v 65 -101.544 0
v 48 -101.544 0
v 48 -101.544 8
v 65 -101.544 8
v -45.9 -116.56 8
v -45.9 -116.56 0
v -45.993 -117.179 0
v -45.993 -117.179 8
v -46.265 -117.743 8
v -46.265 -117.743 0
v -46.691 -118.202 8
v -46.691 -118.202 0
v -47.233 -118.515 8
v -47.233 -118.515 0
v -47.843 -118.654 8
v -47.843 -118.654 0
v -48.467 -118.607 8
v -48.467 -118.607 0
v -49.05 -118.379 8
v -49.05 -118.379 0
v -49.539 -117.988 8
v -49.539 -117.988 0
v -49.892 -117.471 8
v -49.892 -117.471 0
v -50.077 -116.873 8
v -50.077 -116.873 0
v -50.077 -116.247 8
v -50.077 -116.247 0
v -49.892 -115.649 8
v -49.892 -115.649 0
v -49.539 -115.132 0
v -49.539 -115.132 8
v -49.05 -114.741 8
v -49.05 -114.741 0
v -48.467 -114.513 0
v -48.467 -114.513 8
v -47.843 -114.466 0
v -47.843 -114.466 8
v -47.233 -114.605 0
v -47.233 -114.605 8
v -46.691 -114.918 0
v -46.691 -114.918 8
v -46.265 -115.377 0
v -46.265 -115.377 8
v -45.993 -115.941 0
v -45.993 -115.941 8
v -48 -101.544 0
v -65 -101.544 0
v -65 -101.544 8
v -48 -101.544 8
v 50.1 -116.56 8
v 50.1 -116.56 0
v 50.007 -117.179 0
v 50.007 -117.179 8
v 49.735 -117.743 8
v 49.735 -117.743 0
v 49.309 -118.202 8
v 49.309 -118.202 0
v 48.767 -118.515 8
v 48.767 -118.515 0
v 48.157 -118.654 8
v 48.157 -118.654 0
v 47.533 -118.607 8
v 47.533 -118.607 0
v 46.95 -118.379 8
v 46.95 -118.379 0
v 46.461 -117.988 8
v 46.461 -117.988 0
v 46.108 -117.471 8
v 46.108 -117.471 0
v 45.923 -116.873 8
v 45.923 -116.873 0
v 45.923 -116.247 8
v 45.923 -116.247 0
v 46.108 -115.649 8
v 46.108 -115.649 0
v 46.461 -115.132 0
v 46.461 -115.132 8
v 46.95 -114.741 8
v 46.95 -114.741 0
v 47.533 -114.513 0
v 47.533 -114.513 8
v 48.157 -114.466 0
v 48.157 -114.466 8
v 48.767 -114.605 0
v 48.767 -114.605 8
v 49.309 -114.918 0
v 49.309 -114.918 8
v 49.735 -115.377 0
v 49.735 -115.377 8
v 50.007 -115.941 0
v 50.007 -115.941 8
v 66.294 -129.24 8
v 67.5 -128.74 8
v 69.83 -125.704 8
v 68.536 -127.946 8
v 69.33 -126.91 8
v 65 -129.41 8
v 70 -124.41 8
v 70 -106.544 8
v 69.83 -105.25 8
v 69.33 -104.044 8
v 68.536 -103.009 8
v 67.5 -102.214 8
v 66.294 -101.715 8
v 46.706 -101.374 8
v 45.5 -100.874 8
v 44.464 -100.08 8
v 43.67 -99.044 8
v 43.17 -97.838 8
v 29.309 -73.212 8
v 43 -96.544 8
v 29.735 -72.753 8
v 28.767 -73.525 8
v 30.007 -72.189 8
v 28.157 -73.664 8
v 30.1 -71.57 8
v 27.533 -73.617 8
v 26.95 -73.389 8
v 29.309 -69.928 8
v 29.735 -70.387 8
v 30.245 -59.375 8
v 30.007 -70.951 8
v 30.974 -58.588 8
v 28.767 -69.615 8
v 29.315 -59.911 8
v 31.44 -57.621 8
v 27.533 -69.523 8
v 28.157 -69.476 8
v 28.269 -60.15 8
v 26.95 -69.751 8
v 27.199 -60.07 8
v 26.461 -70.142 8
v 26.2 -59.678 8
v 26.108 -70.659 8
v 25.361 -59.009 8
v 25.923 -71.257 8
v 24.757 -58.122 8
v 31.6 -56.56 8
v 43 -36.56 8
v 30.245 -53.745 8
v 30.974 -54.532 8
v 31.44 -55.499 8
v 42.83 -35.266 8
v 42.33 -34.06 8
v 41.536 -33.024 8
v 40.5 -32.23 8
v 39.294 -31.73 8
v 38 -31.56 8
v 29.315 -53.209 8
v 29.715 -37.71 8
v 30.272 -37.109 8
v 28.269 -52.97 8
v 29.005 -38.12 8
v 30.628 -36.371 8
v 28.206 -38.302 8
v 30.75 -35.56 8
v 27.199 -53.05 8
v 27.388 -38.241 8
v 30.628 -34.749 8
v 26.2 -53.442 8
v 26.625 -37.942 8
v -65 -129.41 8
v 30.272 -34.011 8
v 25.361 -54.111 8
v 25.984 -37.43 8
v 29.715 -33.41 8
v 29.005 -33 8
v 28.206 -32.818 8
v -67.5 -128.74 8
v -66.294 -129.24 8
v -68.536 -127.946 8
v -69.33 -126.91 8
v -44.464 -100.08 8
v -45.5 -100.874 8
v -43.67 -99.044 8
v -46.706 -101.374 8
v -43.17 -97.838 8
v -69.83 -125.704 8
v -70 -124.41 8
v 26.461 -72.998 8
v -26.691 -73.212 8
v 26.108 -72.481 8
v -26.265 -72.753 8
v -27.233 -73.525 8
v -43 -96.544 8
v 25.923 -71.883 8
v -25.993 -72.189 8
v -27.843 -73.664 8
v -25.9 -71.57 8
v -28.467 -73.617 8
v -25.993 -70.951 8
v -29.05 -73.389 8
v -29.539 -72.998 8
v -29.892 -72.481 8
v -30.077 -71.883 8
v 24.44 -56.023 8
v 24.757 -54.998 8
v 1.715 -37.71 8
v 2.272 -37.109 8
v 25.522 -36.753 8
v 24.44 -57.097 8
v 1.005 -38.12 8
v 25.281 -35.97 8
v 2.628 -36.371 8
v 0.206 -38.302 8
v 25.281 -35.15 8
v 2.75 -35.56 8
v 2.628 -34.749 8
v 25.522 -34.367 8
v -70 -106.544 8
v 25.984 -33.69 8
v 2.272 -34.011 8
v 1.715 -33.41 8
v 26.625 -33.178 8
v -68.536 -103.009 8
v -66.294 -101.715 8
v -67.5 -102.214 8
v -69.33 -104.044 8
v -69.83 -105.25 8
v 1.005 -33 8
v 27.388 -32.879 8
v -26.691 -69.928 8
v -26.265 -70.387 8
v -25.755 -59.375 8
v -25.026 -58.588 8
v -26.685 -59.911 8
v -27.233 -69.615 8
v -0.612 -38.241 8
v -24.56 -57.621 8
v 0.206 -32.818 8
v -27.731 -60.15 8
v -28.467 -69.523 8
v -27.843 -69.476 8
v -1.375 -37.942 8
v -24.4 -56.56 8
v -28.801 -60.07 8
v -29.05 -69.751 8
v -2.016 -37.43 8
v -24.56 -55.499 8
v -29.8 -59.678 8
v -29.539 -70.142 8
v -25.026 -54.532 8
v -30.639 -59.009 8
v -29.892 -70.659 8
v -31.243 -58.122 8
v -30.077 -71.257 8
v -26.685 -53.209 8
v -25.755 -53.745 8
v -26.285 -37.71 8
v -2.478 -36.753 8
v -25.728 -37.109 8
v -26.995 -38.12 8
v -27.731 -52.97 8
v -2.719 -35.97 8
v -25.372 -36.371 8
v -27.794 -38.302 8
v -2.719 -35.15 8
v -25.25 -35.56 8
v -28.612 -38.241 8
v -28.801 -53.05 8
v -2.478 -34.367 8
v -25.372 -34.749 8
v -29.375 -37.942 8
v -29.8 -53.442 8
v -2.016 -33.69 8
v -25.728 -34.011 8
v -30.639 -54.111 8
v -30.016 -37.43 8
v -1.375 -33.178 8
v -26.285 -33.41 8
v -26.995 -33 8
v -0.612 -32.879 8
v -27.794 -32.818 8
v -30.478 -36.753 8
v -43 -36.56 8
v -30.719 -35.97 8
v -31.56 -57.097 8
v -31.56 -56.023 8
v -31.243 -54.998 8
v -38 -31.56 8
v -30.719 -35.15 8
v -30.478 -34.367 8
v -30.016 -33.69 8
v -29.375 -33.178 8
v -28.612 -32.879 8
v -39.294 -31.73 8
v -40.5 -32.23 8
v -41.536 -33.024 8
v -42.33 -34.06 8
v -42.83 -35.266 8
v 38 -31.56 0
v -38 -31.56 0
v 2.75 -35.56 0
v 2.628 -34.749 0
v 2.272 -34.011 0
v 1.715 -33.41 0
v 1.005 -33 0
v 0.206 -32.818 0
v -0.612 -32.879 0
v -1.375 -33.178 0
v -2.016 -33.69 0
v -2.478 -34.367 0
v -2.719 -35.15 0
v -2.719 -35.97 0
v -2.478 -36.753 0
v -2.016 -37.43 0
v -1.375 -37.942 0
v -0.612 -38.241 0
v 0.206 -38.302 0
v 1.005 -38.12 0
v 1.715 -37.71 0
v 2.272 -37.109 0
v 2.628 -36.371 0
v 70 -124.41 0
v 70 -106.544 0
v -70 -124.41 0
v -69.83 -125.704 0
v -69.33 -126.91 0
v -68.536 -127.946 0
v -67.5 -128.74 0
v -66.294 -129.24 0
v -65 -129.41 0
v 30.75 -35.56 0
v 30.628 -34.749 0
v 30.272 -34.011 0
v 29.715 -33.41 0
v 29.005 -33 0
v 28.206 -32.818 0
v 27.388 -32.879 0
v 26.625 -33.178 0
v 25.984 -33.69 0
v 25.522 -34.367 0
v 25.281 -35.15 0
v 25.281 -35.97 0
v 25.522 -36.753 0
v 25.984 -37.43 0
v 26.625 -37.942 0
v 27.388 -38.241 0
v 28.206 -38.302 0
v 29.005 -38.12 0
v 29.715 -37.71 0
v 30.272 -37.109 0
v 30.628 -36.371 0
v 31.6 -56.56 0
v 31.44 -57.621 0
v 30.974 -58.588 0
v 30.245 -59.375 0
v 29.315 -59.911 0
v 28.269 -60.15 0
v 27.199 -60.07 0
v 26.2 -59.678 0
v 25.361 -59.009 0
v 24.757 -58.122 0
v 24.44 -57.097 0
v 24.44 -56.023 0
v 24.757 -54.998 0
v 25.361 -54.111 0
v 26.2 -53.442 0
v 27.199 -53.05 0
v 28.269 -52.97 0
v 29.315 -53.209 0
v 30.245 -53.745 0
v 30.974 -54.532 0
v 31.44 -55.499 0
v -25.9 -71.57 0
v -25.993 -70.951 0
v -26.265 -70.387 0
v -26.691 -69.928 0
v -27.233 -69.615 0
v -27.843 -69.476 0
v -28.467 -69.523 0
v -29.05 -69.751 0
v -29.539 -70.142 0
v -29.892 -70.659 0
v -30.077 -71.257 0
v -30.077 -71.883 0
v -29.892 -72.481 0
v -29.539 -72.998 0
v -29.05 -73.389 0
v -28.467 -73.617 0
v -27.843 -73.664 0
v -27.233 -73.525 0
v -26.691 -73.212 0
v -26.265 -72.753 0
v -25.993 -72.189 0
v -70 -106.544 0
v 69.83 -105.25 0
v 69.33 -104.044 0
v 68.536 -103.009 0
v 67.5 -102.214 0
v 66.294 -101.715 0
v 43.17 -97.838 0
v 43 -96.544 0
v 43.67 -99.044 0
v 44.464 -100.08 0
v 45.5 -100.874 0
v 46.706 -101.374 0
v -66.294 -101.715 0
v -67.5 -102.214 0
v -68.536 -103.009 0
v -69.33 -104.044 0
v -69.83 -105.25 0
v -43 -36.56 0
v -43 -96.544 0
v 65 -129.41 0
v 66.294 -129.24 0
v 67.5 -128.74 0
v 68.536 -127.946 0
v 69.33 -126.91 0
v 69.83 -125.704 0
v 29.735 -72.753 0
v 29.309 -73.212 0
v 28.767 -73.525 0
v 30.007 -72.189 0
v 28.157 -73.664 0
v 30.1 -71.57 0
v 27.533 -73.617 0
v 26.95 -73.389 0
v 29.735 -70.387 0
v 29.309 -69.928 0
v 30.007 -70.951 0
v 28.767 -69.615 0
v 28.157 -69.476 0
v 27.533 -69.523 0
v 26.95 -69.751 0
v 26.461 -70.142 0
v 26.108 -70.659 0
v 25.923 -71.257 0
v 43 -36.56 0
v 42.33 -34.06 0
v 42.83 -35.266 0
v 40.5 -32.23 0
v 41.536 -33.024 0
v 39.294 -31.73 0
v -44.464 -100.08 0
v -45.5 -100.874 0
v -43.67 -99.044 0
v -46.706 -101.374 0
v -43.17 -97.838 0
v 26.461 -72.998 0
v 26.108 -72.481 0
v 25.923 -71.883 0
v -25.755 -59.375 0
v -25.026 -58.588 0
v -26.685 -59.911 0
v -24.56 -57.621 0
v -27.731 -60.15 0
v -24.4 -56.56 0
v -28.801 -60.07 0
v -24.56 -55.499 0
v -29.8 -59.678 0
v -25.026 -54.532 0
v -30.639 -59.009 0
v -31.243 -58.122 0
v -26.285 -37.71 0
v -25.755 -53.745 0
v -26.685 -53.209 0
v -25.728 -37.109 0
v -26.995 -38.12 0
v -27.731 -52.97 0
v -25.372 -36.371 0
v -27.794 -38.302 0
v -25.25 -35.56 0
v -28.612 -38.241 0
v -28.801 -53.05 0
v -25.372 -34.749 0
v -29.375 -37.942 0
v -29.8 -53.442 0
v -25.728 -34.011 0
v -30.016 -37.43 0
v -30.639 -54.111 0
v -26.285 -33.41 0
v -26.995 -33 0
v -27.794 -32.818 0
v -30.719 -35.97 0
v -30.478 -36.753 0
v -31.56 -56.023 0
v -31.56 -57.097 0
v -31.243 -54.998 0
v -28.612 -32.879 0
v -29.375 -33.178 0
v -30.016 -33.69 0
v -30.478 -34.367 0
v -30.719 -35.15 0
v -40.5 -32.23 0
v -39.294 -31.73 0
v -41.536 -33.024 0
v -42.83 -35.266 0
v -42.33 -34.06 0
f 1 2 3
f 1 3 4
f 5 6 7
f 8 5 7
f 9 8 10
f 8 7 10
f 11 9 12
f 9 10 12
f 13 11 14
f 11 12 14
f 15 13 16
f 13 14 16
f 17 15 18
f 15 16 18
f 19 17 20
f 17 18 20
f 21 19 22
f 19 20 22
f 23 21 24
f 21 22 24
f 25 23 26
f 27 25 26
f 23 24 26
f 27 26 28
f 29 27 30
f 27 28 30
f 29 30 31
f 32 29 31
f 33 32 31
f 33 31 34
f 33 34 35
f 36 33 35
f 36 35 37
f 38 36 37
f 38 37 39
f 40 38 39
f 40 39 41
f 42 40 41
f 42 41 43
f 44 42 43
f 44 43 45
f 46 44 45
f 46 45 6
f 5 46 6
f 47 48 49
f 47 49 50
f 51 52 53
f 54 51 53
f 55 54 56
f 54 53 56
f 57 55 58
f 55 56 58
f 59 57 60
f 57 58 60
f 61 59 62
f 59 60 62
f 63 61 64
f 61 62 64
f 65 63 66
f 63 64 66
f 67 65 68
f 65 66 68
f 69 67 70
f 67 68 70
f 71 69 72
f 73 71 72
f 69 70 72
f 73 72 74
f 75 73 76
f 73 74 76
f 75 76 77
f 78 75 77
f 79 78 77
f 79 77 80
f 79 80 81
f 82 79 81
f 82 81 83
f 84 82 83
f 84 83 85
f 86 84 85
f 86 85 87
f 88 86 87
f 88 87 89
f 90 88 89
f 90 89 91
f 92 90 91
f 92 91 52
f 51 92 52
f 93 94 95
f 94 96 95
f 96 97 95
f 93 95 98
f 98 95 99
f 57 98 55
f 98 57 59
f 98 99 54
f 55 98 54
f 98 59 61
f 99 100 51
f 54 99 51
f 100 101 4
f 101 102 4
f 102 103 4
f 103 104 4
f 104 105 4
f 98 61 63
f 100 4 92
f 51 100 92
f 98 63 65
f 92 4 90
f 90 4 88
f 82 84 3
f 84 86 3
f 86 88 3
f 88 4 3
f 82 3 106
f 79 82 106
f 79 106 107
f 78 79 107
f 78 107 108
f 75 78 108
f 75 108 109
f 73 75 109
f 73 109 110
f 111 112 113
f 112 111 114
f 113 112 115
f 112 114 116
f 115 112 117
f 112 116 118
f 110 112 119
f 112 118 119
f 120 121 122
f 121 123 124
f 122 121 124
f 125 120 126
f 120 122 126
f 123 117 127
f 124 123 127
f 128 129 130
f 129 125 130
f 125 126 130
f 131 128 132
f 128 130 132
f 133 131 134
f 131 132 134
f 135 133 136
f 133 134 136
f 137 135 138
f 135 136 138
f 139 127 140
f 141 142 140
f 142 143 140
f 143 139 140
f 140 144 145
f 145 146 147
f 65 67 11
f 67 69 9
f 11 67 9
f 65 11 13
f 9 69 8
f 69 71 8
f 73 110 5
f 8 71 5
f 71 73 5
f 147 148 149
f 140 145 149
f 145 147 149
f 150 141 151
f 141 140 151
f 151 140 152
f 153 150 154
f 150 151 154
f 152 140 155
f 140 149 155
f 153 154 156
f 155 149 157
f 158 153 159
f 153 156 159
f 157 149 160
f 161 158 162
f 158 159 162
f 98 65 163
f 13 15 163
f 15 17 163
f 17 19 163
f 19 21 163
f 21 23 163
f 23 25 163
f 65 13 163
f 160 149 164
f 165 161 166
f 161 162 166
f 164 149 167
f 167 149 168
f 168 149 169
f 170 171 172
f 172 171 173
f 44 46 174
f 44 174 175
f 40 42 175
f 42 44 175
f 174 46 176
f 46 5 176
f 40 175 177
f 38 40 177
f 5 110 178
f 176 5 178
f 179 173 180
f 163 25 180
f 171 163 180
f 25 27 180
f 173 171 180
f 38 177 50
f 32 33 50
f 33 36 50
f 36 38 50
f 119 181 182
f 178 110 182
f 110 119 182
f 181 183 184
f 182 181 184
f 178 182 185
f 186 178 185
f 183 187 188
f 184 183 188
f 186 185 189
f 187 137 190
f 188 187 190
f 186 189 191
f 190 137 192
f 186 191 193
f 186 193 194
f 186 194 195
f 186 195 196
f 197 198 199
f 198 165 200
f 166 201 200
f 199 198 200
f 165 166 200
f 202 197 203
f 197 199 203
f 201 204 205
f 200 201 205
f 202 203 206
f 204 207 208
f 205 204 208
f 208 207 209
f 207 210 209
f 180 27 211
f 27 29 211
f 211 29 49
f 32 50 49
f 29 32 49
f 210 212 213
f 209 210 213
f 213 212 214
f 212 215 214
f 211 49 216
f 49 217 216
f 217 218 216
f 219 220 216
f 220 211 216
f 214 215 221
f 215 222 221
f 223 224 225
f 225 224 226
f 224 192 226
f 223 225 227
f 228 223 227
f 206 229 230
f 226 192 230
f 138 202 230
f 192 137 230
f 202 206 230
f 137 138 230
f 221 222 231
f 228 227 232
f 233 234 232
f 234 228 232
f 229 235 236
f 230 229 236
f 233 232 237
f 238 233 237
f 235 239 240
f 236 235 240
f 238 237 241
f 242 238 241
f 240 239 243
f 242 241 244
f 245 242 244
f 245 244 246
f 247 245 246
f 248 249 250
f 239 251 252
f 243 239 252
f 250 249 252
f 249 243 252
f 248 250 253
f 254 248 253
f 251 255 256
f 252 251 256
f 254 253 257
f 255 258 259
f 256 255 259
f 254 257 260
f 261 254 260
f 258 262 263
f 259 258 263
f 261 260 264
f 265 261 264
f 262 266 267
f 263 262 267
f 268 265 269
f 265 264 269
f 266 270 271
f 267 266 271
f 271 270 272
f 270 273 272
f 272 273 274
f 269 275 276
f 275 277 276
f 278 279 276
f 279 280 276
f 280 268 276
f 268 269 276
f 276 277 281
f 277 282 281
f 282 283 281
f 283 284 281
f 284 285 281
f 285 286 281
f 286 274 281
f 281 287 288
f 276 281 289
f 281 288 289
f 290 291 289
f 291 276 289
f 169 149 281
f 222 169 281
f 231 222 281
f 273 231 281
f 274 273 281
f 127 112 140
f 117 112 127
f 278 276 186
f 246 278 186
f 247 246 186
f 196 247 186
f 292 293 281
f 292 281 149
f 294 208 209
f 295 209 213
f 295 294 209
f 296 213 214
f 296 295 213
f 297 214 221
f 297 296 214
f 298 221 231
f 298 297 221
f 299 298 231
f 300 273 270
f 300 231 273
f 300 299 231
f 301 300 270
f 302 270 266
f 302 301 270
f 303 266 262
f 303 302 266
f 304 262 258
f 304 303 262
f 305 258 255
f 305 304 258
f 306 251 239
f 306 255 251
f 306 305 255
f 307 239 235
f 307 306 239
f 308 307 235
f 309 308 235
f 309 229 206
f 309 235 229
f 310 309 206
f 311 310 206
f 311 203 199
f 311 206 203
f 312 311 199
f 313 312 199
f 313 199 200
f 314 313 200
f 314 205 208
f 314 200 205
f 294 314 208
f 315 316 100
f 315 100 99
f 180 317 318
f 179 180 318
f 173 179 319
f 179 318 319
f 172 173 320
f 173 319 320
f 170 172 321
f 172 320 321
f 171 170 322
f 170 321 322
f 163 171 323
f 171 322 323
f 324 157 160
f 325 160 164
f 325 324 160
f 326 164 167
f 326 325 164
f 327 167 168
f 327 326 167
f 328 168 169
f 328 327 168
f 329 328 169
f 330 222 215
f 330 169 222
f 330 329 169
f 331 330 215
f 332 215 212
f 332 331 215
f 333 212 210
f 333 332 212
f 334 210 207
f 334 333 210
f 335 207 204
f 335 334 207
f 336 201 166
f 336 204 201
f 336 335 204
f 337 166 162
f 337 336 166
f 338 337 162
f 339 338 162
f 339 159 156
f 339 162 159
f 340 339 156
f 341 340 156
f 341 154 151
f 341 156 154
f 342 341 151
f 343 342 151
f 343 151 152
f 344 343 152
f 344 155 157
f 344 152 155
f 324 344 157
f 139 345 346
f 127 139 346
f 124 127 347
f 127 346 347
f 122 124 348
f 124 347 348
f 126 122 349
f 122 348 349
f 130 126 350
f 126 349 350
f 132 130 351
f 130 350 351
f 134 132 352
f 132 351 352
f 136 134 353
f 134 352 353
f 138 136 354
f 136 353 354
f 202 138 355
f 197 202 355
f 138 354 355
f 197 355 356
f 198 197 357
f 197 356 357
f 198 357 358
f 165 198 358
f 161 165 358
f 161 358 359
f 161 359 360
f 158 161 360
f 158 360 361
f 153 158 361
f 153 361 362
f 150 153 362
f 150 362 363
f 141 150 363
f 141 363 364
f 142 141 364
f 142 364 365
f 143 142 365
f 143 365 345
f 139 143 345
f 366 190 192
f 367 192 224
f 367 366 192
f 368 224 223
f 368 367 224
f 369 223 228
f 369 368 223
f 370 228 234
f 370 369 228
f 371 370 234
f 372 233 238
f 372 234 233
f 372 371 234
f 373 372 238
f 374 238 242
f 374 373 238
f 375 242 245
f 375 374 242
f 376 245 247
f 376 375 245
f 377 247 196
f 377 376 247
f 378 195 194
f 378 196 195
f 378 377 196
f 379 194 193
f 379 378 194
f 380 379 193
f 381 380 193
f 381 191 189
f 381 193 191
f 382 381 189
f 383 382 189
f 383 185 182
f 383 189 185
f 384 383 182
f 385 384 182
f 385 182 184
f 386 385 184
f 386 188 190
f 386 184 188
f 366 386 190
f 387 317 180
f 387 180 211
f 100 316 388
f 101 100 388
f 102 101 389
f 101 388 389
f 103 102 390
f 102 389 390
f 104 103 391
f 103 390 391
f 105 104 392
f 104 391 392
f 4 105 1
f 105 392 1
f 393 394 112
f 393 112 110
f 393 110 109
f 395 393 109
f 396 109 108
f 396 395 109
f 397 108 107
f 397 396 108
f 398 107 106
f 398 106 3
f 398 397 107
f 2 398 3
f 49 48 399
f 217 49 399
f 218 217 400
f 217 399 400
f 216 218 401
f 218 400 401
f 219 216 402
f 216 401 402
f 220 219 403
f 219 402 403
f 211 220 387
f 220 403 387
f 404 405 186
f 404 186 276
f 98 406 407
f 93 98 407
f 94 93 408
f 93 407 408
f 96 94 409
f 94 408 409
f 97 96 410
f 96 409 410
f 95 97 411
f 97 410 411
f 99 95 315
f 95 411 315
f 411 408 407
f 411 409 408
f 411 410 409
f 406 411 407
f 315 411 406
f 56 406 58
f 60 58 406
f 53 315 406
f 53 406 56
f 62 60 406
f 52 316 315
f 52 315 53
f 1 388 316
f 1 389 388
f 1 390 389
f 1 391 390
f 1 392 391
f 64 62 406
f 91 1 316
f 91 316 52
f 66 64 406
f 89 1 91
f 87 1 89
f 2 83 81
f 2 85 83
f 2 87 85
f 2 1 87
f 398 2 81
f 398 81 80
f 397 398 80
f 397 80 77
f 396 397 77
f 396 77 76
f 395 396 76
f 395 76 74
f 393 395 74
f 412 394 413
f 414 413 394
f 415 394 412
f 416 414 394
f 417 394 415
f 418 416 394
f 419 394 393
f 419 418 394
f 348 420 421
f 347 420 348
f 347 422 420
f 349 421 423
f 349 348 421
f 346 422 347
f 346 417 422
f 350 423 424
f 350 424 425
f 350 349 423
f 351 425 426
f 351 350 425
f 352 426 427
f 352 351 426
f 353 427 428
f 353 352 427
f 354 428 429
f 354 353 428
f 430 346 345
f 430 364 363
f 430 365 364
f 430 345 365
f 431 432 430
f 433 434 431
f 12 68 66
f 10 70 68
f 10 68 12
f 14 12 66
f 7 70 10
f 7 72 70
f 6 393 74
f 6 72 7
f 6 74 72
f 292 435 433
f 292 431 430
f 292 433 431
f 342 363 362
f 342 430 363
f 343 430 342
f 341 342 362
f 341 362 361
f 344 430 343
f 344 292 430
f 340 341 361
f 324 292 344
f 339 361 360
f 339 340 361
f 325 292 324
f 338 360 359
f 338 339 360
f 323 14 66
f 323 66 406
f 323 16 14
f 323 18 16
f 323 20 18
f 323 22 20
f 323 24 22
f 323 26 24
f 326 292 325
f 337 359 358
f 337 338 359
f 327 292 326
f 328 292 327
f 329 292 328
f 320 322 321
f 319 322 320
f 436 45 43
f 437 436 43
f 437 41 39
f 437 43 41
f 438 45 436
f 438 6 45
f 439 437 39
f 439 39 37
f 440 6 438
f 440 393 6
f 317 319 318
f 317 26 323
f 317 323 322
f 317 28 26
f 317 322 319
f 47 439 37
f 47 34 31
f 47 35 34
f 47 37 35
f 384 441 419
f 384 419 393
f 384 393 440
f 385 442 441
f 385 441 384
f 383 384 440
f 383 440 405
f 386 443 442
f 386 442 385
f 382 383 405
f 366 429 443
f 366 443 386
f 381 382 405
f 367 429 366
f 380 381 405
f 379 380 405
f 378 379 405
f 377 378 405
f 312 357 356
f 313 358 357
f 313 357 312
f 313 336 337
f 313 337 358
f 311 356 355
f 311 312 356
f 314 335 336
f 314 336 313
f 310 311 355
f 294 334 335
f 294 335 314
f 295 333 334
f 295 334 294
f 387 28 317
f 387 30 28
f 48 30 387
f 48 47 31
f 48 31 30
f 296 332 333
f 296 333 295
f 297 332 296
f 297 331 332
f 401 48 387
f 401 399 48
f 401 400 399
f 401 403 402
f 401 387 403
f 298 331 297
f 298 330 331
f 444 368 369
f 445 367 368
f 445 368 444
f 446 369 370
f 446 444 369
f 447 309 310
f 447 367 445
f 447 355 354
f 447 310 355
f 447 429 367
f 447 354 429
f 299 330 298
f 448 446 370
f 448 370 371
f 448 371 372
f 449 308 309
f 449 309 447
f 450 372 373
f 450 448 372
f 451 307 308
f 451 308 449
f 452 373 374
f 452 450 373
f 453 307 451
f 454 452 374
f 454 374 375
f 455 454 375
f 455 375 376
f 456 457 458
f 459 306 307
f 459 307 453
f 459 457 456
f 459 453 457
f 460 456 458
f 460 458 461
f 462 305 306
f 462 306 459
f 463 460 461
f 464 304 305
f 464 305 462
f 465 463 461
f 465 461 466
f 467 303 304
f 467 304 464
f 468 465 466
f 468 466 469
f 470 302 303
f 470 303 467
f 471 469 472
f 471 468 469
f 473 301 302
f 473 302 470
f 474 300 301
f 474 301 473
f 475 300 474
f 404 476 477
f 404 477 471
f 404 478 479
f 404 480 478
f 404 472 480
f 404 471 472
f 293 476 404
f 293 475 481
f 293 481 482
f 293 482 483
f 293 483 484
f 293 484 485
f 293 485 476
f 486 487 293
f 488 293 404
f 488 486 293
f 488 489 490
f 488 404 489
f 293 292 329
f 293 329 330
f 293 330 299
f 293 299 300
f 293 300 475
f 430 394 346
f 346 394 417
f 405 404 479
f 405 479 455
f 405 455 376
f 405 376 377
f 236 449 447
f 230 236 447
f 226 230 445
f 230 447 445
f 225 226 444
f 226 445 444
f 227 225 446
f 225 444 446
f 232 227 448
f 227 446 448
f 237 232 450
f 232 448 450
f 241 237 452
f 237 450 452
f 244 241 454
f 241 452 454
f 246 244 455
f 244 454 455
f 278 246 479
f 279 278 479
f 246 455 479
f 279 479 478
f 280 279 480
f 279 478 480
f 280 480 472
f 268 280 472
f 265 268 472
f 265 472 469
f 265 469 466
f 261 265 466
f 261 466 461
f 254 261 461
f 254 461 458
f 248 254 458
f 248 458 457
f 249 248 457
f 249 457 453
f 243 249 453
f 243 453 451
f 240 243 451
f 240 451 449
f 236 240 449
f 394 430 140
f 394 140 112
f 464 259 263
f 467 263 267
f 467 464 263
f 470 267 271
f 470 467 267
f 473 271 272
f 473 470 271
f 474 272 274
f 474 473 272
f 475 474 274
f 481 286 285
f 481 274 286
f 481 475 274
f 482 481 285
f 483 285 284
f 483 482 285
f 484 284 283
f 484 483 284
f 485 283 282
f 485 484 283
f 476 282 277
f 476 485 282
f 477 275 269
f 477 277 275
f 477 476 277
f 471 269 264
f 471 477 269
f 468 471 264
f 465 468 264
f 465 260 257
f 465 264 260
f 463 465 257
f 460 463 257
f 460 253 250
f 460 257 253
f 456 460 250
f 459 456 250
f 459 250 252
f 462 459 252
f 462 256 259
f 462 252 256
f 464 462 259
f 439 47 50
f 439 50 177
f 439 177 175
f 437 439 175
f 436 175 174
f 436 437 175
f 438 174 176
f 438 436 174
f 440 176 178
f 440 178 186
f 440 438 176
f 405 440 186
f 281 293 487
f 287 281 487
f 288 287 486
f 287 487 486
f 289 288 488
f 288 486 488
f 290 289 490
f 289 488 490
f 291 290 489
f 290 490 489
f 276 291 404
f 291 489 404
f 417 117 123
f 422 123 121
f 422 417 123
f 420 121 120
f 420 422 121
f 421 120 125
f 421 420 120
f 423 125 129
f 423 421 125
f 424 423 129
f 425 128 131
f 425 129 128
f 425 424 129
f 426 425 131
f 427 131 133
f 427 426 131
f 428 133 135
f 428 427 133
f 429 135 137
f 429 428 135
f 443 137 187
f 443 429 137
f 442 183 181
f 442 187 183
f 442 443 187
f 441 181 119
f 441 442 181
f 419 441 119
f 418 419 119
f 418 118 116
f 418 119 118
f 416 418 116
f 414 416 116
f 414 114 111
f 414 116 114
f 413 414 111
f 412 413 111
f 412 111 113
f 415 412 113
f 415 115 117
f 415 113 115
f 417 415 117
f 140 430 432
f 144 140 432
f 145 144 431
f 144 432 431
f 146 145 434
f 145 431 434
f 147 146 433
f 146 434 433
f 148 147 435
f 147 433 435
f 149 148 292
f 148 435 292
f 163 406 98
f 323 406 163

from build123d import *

# Parameters (mm, degrees)
PAD_DEPTH     = 8
SKETCH033_R   = 2.1
HOLE007_DEPTH = 25
SKETCH035_R   = 3.6
HOLE009_DEPTH = 25
SKETCH036_R   = 2.1
HOLE010_DEPTH = 25
SKETCH051_R   = 2.75
HOLE018_DEPTH = 25


with BuildPart() as part:
    # Sketch → Pad (new body)
    with BuildSketch(Plane.XY):
        with BuildLine():
            Line((-38, -31.56), (38, -31.56))
            ThreePointArc((43, -36.56), (41.535534, -33.024466), (38, -31.56))
            Line((43, -36.56), (43, -96.544143))
            ThreePointArc((43, -96.544143), (44.464466, -100.079677), (48, -101.544143))
            Line((48, -101.544143), (65, -101.544143))
            ThreePointArc((70, -106.544143), (68.535534, -103.008609), (65, -101.544143))
            Line((70, -106.544143), (70, -124.41))
            ThreePointArc((65, -129.41), (68.535534, -127.945534), (70, -124.41))
            Line((65, -129.41), (-65, -129.41))
            ThreePointArc((-70, -124.41), (-68.535534, -127.945534), (-65, -129.41))
            Line((-70, -124.41), (-70, -106.544143))
            ThreePointArc((-65, -101.544143), (-68.535534, -103.008609), (-70, -106.544143))
            Line((-65, -101.544143), (-48, -101.544143))
            ThreePointArc((-48, -101.544143), (-44.464466, -100.079677), (-43, -96.544143))
            Line((-43, -96.544143), (-43, -36.56))
            ThreePointArc((-38, -31.56), (-41.535534, -33.024466), (-43, -36.56))
        make_face()
    extrude(amount=PAD_DEPTH)

    # Sketch033 (on Face17 of Pad) → Hole007 (cut)
    with BuildSketch(Plane(origin=(0, 0, 0), x_dir=(1, 0, 0), z_dir=(0, 0, -1))):
        with Locations((-48, 116.56)):
            Circle(SKETCH033_R)
        with Locations((48, 116.56)):
            Circle(SKETCH033_R)
    extrude(amount=-HOLE007_DEPTH, mode=Mode.SUBTRACT)

    # Sketch035 (on Face17 of Pad) → Hole009 (cut)
    with BuildSketch(Plane(origin=(0, 0, 0), x_dir=(1, 0, 0), z_dir=(0, 0, -1))):
        with Locations((-28, 56.56)):
            Circle(SKETCH035_R)
        with Locations((28, 56.56)):
            Circle(SKETCH035_R)
    extrude(amount=-HOLE009_DEPTH, mode=Mode.SUBTRACT)

    # Sketch036 (on Hole) → Hole010 (cut)
    with BuildSketch(Plane.XY):
        with Locations((-28, -71.57)):
            Circle(SKETCH036_R)
        with Locations((28, -71.57)):
            Circle(SKETCH036_R)
    extrude(amount=HOLE010_DEPTH, mode=Mode.SUBTRACT)

    # Sketch051 (on Hole) → Hole018 (cut)
    with BuildSketch(Plane.XY):
        with Locations((-28, -35.56)):
            Circle(SKETCH051_R)
        with Locations((0, -35.56)):
            Circle(SKETCH051_R)
        with Locations((28, -35.56)):
            Circle(SKETCH051_R)
    extrude(amount=HOLE018_DEPTH, mode=Mode.SUBTRACT)


solid = part.part
